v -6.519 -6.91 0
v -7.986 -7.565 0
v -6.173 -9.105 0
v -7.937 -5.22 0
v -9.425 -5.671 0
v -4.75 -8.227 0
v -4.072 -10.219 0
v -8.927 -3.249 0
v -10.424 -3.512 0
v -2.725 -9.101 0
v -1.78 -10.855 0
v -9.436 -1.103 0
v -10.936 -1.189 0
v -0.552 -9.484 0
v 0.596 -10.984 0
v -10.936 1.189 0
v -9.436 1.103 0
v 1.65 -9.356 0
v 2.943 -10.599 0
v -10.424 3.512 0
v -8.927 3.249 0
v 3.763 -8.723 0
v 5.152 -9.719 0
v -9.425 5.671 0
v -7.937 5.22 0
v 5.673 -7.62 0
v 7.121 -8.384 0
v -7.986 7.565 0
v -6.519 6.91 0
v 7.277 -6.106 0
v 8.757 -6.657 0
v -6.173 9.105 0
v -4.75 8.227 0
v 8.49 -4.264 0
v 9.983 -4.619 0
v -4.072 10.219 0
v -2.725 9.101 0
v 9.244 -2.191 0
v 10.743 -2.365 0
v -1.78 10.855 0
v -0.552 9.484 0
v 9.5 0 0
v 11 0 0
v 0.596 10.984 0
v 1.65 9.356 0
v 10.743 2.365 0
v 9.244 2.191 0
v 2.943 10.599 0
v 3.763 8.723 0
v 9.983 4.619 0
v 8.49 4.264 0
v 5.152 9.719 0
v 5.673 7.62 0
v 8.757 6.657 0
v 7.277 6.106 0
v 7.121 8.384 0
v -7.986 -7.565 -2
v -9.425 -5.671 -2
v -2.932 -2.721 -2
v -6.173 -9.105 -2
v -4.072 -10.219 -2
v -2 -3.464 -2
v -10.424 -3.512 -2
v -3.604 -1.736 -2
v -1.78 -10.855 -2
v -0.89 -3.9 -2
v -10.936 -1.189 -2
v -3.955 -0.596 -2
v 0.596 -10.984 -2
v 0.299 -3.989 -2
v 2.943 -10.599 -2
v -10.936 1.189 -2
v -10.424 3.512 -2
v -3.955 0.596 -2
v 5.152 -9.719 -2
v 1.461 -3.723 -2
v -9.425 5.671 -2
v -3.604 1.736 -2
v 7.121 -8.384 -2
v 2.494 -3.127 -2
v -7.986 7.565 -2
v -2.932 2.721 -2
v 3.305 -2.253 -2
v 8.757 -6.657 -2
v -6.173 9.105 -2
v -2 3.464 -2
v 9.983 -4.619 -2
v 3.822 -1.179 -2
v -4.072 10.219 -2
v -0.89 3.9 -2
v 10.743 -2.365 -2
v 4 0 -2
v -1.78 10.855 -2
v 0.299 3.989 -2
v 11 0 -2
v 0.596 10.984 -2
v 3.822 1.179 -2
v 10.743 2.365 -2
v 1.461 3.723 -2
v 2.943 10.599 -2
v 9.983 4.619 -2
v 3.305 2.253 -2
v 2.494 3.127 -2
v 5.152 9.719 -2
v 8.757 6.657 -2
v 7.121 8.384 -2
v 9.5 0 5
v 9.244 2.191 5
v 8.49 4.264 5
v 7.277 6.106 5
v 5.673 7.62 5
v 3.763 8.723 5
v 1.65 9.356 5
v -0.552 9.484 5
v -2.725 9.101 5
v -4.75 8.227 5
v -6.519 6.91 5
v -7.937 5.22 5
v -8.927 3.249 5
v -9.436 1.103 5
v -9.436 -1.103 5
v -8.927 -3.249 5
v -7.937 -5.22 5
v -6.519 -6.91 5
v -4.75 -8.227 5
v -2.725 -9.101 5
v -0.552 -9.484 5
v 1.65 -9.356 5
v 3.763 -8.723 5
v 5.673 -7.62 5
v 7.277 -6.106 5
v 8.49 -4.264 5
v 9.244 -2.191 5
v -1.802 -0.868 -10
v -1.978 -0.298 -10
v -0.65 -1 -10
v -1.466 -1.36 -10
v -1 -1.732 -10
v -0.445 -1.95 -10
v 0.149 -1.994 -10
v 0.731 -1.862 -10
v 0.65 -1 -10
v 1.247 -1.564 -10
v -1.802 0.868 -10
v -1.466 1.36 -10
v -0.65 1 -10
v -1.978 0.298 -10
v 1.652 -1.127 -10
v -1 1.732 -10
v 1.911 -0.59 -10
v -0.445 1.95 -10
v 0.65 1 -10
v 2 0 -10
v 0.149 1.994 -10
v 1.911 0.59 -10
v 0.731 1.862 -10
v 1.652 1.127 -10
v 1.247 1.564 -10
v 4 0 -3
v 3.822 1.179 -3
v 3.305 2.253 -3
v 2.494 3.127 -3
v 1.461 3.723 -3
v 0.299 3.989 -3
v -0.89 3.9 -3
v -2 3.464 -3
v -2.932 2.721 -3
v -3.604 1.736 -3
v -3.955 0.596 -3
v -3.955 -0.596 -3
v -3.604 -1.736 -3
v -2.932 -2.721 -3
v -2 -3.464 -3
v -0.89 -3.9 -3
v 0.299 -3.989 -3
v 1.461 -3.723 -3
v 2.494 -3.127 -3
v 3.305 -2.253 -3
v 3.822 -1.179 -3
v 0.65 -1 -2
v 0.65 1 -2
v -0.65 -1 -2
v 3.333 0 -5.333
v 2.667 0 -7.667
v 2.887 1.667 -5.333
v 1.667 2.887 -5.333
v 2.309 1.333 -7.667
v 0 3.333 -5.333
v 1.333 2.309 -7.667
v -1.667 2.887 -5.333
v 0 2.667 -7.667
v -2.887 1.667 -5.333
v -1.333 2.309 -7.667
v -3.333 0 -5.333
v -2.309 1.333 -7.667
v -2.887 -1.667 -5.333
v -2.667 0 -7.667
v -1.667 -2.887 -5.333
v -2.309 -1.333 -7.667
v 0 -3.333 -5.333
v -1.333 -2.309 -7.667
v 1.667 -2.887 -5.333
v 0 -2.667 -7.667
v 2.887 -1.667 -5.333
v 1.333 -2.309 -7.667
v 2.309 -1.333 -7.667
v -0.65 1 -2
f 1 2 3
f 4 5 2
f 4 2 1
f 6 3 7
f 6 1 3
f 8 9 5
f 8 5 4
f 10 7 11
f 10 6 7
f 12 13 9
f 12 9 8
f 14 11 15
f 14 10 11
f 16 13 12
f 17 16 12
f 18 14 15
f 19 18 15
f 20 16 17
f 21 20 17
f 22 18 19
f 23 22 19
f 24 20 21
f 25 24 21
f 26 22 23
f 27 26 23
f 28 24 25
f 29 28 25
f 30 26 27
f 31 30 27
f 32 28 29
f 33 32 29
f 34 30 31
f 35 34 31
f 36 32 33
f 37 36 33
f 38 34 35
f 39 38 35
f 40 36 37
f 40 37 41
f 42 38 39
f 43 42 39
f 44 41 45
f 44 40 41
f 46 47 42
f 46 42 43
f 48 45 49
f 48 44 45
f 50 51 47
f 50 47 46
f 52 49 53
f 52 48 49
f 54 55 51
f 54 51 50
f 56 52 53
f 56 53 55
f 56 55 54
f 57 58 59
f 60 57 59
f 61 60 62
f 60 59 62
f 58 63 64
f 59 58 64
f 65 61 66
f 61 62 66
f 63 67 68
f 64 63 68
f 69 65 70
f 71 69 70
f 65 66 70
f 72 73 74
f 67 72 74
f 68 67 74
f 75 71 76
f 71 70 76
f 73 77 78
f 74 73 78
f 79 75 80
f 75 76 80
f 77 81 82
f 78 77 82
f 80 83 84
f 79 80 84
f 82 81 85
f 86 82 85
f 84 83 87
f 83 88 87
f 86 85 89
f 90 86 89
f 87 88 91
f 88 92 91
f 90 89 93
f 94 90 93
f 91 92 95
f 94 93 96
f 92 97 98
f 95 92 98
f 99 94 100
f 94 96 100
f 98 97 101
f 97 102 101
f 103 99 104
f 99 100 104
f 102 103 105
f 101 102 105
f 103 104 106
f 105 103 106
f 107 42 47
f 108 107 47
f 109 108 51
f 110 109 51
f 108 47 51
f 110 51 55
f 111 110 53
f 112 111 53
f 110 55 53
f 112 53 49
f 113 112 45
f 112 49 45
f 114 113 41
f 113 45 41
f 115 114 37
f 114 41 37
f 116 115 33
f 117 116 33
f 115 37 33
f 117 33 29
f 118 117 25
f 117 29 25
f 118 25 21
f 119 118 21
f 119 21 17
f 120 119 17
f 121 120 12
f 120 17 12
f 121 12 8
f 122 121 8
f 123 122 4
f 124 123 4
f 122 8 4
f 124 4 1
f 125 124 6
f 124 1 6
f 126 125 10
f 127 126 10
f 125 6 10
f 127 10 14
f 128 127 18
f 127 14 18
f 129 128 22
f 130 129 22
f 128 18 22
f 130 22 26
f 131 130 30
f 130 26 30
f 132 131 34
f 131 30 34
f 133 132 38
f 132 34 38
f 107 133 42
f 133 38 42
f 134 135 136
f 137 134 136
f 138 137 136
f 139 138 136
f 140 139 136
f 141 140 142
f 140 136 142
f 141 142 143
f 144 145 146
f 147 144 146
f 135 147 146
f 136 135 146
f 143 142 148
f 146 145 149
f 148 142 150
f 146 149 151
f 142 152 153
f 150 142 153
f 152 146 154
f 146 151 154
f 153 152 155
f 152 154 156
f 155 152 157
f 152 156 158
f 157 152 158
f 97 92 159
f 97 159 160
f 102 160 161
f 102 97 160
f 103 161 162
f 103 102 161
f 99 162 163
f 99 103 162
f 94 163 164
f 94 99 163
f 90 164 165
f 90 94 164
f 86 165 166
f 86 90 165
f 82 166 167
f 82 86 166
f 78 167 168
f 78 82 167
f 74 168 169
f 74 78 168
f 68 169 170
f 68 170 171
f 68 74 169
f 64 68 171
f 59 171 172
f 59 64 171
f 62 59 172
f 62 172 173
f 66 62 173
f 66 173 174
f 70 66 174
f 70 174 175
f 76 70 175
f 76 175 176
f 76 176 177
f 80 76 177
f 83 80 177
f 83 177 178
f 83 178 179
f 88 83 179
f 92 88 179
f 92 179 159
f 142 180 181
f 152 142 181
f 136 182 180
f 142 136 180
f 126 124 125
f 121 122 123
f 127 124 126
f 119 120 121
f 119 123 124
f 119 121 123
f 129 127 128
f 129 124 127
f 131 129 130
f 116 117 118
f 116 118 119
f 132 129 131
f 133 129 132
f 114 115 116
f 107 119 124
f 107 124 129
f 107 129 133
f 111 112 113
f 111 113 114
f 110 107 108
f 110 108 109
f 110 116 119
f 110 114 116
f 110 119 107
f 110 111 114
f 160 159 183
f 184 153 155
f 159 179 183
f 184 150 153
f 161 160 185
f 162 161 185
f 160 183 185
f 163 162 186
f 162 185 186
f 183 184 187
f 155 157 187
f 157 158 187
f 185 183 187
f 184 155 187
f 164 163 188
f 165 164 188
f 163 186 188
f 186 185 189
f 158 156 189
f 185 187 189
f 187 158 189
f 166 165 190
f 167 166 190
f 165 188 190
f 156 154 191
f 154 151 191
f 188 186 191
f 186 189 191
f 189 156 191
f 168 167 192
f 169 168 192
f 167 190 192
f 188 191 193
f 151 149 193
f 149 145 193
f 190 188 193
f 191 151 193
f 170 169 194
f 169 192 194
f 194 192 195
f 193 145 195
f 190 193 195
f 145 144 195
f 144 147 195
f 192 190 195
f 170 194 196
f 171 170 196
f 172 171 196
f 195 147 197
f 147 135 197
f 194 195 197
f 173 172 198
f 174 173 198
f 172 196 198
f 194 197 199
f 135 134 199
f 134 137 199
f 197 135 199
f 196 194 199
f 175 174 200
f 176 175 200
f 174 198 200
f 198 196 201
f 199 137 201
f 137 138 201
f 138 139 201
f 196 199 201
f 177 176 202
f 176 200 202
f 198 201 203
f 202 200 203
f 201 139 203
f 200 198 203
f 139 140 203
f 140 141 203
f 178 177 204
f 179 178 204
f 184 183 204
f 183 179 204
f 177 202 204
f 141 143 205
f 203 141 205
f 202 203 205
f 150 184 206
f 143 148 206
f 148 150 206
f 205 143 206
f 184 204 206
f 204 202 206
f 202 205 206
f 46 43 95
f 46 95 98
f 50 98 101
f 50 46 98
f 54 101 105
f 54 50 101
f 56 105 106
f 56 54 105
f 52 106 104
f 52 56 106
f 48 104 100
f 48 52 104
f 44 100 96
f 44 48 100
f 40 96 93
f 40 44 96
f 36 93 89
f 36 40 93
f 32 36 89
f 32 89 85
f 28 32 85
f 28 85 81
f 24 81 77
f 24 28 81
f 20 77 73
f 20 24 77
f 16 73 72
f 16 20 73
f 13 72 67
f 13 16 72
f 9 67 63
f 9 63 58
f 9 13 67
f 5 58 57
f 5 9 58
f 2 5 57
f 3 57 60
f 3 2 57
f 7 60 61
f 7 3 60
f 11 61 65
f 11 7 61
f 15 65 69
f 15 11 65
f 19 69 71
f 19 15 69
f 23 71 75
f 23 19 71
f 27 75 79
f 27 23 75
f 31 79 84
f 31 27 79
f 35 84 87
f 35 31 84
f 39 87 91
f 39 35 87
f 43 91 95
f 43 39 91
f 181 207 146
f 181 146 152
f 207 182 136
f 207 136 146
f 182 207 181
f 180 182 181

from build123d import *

# Parameters (mm, degrees)
F0_R     = 11
F0_R_2   = 9.5
F0_R_3   = 4
F0_W     = 1.3
F0_H     = 2
F1_DEPTH = 2
F2_DEPTH = 5
F3_DEPTH = 10
F4_SIZE2 = 2
F4_SIZE  = 7


with BuildPart() as f1:
    # F0 (on Top) → F1 (new body)
    with BuildSketch(Plane.XY):
        Circle(F0_R)
        Circle(F0_R_2, mode=Mode.SUBTRACT)
        Circle(F0_R_2)
        Circle(F0_R_3, mode=Mode.SUBTRACT)
        Circle(F0_R_3)
        Rectangle(F0_W, F0_H, mode=Mode.SUBTRACT)
        Rectangle(F0_W, F0_H)
    extrude(amount=-F1_DEPTH)

    # F0 (on Top) → F2 (join)
    with BuildSketch(Plane.XY):
        Circle(F0_R_2)
        Circle(F0_R_3, mode=Mode.SUBTRACT)
        Circle(F0_R_3)
        Rectangle(F0_W, F0_H, mode=Mode.SUBTRACT)
        Rectangle(F0_W, F0_H)
    extrude(amount=F2_DEPTH)

    # F0 (on Top) → F3 (join)
    with BuildSketch(Plane.XY):
        Circle(F0_R_3)
        Rectangle(F0_W, F0_H, mode=Mode.SUBTRACT)
    extrude(amount=-F3_DEPTH)

    # F4
    f4_edges = [f1.edges().sort_by_distance(p)[0] for p in [
        (-4, 0, -10),
    ]]
    chamfer(f4_edges, length=F4_SIZE, length2=F4_SIZE2)


solid = f1.part
